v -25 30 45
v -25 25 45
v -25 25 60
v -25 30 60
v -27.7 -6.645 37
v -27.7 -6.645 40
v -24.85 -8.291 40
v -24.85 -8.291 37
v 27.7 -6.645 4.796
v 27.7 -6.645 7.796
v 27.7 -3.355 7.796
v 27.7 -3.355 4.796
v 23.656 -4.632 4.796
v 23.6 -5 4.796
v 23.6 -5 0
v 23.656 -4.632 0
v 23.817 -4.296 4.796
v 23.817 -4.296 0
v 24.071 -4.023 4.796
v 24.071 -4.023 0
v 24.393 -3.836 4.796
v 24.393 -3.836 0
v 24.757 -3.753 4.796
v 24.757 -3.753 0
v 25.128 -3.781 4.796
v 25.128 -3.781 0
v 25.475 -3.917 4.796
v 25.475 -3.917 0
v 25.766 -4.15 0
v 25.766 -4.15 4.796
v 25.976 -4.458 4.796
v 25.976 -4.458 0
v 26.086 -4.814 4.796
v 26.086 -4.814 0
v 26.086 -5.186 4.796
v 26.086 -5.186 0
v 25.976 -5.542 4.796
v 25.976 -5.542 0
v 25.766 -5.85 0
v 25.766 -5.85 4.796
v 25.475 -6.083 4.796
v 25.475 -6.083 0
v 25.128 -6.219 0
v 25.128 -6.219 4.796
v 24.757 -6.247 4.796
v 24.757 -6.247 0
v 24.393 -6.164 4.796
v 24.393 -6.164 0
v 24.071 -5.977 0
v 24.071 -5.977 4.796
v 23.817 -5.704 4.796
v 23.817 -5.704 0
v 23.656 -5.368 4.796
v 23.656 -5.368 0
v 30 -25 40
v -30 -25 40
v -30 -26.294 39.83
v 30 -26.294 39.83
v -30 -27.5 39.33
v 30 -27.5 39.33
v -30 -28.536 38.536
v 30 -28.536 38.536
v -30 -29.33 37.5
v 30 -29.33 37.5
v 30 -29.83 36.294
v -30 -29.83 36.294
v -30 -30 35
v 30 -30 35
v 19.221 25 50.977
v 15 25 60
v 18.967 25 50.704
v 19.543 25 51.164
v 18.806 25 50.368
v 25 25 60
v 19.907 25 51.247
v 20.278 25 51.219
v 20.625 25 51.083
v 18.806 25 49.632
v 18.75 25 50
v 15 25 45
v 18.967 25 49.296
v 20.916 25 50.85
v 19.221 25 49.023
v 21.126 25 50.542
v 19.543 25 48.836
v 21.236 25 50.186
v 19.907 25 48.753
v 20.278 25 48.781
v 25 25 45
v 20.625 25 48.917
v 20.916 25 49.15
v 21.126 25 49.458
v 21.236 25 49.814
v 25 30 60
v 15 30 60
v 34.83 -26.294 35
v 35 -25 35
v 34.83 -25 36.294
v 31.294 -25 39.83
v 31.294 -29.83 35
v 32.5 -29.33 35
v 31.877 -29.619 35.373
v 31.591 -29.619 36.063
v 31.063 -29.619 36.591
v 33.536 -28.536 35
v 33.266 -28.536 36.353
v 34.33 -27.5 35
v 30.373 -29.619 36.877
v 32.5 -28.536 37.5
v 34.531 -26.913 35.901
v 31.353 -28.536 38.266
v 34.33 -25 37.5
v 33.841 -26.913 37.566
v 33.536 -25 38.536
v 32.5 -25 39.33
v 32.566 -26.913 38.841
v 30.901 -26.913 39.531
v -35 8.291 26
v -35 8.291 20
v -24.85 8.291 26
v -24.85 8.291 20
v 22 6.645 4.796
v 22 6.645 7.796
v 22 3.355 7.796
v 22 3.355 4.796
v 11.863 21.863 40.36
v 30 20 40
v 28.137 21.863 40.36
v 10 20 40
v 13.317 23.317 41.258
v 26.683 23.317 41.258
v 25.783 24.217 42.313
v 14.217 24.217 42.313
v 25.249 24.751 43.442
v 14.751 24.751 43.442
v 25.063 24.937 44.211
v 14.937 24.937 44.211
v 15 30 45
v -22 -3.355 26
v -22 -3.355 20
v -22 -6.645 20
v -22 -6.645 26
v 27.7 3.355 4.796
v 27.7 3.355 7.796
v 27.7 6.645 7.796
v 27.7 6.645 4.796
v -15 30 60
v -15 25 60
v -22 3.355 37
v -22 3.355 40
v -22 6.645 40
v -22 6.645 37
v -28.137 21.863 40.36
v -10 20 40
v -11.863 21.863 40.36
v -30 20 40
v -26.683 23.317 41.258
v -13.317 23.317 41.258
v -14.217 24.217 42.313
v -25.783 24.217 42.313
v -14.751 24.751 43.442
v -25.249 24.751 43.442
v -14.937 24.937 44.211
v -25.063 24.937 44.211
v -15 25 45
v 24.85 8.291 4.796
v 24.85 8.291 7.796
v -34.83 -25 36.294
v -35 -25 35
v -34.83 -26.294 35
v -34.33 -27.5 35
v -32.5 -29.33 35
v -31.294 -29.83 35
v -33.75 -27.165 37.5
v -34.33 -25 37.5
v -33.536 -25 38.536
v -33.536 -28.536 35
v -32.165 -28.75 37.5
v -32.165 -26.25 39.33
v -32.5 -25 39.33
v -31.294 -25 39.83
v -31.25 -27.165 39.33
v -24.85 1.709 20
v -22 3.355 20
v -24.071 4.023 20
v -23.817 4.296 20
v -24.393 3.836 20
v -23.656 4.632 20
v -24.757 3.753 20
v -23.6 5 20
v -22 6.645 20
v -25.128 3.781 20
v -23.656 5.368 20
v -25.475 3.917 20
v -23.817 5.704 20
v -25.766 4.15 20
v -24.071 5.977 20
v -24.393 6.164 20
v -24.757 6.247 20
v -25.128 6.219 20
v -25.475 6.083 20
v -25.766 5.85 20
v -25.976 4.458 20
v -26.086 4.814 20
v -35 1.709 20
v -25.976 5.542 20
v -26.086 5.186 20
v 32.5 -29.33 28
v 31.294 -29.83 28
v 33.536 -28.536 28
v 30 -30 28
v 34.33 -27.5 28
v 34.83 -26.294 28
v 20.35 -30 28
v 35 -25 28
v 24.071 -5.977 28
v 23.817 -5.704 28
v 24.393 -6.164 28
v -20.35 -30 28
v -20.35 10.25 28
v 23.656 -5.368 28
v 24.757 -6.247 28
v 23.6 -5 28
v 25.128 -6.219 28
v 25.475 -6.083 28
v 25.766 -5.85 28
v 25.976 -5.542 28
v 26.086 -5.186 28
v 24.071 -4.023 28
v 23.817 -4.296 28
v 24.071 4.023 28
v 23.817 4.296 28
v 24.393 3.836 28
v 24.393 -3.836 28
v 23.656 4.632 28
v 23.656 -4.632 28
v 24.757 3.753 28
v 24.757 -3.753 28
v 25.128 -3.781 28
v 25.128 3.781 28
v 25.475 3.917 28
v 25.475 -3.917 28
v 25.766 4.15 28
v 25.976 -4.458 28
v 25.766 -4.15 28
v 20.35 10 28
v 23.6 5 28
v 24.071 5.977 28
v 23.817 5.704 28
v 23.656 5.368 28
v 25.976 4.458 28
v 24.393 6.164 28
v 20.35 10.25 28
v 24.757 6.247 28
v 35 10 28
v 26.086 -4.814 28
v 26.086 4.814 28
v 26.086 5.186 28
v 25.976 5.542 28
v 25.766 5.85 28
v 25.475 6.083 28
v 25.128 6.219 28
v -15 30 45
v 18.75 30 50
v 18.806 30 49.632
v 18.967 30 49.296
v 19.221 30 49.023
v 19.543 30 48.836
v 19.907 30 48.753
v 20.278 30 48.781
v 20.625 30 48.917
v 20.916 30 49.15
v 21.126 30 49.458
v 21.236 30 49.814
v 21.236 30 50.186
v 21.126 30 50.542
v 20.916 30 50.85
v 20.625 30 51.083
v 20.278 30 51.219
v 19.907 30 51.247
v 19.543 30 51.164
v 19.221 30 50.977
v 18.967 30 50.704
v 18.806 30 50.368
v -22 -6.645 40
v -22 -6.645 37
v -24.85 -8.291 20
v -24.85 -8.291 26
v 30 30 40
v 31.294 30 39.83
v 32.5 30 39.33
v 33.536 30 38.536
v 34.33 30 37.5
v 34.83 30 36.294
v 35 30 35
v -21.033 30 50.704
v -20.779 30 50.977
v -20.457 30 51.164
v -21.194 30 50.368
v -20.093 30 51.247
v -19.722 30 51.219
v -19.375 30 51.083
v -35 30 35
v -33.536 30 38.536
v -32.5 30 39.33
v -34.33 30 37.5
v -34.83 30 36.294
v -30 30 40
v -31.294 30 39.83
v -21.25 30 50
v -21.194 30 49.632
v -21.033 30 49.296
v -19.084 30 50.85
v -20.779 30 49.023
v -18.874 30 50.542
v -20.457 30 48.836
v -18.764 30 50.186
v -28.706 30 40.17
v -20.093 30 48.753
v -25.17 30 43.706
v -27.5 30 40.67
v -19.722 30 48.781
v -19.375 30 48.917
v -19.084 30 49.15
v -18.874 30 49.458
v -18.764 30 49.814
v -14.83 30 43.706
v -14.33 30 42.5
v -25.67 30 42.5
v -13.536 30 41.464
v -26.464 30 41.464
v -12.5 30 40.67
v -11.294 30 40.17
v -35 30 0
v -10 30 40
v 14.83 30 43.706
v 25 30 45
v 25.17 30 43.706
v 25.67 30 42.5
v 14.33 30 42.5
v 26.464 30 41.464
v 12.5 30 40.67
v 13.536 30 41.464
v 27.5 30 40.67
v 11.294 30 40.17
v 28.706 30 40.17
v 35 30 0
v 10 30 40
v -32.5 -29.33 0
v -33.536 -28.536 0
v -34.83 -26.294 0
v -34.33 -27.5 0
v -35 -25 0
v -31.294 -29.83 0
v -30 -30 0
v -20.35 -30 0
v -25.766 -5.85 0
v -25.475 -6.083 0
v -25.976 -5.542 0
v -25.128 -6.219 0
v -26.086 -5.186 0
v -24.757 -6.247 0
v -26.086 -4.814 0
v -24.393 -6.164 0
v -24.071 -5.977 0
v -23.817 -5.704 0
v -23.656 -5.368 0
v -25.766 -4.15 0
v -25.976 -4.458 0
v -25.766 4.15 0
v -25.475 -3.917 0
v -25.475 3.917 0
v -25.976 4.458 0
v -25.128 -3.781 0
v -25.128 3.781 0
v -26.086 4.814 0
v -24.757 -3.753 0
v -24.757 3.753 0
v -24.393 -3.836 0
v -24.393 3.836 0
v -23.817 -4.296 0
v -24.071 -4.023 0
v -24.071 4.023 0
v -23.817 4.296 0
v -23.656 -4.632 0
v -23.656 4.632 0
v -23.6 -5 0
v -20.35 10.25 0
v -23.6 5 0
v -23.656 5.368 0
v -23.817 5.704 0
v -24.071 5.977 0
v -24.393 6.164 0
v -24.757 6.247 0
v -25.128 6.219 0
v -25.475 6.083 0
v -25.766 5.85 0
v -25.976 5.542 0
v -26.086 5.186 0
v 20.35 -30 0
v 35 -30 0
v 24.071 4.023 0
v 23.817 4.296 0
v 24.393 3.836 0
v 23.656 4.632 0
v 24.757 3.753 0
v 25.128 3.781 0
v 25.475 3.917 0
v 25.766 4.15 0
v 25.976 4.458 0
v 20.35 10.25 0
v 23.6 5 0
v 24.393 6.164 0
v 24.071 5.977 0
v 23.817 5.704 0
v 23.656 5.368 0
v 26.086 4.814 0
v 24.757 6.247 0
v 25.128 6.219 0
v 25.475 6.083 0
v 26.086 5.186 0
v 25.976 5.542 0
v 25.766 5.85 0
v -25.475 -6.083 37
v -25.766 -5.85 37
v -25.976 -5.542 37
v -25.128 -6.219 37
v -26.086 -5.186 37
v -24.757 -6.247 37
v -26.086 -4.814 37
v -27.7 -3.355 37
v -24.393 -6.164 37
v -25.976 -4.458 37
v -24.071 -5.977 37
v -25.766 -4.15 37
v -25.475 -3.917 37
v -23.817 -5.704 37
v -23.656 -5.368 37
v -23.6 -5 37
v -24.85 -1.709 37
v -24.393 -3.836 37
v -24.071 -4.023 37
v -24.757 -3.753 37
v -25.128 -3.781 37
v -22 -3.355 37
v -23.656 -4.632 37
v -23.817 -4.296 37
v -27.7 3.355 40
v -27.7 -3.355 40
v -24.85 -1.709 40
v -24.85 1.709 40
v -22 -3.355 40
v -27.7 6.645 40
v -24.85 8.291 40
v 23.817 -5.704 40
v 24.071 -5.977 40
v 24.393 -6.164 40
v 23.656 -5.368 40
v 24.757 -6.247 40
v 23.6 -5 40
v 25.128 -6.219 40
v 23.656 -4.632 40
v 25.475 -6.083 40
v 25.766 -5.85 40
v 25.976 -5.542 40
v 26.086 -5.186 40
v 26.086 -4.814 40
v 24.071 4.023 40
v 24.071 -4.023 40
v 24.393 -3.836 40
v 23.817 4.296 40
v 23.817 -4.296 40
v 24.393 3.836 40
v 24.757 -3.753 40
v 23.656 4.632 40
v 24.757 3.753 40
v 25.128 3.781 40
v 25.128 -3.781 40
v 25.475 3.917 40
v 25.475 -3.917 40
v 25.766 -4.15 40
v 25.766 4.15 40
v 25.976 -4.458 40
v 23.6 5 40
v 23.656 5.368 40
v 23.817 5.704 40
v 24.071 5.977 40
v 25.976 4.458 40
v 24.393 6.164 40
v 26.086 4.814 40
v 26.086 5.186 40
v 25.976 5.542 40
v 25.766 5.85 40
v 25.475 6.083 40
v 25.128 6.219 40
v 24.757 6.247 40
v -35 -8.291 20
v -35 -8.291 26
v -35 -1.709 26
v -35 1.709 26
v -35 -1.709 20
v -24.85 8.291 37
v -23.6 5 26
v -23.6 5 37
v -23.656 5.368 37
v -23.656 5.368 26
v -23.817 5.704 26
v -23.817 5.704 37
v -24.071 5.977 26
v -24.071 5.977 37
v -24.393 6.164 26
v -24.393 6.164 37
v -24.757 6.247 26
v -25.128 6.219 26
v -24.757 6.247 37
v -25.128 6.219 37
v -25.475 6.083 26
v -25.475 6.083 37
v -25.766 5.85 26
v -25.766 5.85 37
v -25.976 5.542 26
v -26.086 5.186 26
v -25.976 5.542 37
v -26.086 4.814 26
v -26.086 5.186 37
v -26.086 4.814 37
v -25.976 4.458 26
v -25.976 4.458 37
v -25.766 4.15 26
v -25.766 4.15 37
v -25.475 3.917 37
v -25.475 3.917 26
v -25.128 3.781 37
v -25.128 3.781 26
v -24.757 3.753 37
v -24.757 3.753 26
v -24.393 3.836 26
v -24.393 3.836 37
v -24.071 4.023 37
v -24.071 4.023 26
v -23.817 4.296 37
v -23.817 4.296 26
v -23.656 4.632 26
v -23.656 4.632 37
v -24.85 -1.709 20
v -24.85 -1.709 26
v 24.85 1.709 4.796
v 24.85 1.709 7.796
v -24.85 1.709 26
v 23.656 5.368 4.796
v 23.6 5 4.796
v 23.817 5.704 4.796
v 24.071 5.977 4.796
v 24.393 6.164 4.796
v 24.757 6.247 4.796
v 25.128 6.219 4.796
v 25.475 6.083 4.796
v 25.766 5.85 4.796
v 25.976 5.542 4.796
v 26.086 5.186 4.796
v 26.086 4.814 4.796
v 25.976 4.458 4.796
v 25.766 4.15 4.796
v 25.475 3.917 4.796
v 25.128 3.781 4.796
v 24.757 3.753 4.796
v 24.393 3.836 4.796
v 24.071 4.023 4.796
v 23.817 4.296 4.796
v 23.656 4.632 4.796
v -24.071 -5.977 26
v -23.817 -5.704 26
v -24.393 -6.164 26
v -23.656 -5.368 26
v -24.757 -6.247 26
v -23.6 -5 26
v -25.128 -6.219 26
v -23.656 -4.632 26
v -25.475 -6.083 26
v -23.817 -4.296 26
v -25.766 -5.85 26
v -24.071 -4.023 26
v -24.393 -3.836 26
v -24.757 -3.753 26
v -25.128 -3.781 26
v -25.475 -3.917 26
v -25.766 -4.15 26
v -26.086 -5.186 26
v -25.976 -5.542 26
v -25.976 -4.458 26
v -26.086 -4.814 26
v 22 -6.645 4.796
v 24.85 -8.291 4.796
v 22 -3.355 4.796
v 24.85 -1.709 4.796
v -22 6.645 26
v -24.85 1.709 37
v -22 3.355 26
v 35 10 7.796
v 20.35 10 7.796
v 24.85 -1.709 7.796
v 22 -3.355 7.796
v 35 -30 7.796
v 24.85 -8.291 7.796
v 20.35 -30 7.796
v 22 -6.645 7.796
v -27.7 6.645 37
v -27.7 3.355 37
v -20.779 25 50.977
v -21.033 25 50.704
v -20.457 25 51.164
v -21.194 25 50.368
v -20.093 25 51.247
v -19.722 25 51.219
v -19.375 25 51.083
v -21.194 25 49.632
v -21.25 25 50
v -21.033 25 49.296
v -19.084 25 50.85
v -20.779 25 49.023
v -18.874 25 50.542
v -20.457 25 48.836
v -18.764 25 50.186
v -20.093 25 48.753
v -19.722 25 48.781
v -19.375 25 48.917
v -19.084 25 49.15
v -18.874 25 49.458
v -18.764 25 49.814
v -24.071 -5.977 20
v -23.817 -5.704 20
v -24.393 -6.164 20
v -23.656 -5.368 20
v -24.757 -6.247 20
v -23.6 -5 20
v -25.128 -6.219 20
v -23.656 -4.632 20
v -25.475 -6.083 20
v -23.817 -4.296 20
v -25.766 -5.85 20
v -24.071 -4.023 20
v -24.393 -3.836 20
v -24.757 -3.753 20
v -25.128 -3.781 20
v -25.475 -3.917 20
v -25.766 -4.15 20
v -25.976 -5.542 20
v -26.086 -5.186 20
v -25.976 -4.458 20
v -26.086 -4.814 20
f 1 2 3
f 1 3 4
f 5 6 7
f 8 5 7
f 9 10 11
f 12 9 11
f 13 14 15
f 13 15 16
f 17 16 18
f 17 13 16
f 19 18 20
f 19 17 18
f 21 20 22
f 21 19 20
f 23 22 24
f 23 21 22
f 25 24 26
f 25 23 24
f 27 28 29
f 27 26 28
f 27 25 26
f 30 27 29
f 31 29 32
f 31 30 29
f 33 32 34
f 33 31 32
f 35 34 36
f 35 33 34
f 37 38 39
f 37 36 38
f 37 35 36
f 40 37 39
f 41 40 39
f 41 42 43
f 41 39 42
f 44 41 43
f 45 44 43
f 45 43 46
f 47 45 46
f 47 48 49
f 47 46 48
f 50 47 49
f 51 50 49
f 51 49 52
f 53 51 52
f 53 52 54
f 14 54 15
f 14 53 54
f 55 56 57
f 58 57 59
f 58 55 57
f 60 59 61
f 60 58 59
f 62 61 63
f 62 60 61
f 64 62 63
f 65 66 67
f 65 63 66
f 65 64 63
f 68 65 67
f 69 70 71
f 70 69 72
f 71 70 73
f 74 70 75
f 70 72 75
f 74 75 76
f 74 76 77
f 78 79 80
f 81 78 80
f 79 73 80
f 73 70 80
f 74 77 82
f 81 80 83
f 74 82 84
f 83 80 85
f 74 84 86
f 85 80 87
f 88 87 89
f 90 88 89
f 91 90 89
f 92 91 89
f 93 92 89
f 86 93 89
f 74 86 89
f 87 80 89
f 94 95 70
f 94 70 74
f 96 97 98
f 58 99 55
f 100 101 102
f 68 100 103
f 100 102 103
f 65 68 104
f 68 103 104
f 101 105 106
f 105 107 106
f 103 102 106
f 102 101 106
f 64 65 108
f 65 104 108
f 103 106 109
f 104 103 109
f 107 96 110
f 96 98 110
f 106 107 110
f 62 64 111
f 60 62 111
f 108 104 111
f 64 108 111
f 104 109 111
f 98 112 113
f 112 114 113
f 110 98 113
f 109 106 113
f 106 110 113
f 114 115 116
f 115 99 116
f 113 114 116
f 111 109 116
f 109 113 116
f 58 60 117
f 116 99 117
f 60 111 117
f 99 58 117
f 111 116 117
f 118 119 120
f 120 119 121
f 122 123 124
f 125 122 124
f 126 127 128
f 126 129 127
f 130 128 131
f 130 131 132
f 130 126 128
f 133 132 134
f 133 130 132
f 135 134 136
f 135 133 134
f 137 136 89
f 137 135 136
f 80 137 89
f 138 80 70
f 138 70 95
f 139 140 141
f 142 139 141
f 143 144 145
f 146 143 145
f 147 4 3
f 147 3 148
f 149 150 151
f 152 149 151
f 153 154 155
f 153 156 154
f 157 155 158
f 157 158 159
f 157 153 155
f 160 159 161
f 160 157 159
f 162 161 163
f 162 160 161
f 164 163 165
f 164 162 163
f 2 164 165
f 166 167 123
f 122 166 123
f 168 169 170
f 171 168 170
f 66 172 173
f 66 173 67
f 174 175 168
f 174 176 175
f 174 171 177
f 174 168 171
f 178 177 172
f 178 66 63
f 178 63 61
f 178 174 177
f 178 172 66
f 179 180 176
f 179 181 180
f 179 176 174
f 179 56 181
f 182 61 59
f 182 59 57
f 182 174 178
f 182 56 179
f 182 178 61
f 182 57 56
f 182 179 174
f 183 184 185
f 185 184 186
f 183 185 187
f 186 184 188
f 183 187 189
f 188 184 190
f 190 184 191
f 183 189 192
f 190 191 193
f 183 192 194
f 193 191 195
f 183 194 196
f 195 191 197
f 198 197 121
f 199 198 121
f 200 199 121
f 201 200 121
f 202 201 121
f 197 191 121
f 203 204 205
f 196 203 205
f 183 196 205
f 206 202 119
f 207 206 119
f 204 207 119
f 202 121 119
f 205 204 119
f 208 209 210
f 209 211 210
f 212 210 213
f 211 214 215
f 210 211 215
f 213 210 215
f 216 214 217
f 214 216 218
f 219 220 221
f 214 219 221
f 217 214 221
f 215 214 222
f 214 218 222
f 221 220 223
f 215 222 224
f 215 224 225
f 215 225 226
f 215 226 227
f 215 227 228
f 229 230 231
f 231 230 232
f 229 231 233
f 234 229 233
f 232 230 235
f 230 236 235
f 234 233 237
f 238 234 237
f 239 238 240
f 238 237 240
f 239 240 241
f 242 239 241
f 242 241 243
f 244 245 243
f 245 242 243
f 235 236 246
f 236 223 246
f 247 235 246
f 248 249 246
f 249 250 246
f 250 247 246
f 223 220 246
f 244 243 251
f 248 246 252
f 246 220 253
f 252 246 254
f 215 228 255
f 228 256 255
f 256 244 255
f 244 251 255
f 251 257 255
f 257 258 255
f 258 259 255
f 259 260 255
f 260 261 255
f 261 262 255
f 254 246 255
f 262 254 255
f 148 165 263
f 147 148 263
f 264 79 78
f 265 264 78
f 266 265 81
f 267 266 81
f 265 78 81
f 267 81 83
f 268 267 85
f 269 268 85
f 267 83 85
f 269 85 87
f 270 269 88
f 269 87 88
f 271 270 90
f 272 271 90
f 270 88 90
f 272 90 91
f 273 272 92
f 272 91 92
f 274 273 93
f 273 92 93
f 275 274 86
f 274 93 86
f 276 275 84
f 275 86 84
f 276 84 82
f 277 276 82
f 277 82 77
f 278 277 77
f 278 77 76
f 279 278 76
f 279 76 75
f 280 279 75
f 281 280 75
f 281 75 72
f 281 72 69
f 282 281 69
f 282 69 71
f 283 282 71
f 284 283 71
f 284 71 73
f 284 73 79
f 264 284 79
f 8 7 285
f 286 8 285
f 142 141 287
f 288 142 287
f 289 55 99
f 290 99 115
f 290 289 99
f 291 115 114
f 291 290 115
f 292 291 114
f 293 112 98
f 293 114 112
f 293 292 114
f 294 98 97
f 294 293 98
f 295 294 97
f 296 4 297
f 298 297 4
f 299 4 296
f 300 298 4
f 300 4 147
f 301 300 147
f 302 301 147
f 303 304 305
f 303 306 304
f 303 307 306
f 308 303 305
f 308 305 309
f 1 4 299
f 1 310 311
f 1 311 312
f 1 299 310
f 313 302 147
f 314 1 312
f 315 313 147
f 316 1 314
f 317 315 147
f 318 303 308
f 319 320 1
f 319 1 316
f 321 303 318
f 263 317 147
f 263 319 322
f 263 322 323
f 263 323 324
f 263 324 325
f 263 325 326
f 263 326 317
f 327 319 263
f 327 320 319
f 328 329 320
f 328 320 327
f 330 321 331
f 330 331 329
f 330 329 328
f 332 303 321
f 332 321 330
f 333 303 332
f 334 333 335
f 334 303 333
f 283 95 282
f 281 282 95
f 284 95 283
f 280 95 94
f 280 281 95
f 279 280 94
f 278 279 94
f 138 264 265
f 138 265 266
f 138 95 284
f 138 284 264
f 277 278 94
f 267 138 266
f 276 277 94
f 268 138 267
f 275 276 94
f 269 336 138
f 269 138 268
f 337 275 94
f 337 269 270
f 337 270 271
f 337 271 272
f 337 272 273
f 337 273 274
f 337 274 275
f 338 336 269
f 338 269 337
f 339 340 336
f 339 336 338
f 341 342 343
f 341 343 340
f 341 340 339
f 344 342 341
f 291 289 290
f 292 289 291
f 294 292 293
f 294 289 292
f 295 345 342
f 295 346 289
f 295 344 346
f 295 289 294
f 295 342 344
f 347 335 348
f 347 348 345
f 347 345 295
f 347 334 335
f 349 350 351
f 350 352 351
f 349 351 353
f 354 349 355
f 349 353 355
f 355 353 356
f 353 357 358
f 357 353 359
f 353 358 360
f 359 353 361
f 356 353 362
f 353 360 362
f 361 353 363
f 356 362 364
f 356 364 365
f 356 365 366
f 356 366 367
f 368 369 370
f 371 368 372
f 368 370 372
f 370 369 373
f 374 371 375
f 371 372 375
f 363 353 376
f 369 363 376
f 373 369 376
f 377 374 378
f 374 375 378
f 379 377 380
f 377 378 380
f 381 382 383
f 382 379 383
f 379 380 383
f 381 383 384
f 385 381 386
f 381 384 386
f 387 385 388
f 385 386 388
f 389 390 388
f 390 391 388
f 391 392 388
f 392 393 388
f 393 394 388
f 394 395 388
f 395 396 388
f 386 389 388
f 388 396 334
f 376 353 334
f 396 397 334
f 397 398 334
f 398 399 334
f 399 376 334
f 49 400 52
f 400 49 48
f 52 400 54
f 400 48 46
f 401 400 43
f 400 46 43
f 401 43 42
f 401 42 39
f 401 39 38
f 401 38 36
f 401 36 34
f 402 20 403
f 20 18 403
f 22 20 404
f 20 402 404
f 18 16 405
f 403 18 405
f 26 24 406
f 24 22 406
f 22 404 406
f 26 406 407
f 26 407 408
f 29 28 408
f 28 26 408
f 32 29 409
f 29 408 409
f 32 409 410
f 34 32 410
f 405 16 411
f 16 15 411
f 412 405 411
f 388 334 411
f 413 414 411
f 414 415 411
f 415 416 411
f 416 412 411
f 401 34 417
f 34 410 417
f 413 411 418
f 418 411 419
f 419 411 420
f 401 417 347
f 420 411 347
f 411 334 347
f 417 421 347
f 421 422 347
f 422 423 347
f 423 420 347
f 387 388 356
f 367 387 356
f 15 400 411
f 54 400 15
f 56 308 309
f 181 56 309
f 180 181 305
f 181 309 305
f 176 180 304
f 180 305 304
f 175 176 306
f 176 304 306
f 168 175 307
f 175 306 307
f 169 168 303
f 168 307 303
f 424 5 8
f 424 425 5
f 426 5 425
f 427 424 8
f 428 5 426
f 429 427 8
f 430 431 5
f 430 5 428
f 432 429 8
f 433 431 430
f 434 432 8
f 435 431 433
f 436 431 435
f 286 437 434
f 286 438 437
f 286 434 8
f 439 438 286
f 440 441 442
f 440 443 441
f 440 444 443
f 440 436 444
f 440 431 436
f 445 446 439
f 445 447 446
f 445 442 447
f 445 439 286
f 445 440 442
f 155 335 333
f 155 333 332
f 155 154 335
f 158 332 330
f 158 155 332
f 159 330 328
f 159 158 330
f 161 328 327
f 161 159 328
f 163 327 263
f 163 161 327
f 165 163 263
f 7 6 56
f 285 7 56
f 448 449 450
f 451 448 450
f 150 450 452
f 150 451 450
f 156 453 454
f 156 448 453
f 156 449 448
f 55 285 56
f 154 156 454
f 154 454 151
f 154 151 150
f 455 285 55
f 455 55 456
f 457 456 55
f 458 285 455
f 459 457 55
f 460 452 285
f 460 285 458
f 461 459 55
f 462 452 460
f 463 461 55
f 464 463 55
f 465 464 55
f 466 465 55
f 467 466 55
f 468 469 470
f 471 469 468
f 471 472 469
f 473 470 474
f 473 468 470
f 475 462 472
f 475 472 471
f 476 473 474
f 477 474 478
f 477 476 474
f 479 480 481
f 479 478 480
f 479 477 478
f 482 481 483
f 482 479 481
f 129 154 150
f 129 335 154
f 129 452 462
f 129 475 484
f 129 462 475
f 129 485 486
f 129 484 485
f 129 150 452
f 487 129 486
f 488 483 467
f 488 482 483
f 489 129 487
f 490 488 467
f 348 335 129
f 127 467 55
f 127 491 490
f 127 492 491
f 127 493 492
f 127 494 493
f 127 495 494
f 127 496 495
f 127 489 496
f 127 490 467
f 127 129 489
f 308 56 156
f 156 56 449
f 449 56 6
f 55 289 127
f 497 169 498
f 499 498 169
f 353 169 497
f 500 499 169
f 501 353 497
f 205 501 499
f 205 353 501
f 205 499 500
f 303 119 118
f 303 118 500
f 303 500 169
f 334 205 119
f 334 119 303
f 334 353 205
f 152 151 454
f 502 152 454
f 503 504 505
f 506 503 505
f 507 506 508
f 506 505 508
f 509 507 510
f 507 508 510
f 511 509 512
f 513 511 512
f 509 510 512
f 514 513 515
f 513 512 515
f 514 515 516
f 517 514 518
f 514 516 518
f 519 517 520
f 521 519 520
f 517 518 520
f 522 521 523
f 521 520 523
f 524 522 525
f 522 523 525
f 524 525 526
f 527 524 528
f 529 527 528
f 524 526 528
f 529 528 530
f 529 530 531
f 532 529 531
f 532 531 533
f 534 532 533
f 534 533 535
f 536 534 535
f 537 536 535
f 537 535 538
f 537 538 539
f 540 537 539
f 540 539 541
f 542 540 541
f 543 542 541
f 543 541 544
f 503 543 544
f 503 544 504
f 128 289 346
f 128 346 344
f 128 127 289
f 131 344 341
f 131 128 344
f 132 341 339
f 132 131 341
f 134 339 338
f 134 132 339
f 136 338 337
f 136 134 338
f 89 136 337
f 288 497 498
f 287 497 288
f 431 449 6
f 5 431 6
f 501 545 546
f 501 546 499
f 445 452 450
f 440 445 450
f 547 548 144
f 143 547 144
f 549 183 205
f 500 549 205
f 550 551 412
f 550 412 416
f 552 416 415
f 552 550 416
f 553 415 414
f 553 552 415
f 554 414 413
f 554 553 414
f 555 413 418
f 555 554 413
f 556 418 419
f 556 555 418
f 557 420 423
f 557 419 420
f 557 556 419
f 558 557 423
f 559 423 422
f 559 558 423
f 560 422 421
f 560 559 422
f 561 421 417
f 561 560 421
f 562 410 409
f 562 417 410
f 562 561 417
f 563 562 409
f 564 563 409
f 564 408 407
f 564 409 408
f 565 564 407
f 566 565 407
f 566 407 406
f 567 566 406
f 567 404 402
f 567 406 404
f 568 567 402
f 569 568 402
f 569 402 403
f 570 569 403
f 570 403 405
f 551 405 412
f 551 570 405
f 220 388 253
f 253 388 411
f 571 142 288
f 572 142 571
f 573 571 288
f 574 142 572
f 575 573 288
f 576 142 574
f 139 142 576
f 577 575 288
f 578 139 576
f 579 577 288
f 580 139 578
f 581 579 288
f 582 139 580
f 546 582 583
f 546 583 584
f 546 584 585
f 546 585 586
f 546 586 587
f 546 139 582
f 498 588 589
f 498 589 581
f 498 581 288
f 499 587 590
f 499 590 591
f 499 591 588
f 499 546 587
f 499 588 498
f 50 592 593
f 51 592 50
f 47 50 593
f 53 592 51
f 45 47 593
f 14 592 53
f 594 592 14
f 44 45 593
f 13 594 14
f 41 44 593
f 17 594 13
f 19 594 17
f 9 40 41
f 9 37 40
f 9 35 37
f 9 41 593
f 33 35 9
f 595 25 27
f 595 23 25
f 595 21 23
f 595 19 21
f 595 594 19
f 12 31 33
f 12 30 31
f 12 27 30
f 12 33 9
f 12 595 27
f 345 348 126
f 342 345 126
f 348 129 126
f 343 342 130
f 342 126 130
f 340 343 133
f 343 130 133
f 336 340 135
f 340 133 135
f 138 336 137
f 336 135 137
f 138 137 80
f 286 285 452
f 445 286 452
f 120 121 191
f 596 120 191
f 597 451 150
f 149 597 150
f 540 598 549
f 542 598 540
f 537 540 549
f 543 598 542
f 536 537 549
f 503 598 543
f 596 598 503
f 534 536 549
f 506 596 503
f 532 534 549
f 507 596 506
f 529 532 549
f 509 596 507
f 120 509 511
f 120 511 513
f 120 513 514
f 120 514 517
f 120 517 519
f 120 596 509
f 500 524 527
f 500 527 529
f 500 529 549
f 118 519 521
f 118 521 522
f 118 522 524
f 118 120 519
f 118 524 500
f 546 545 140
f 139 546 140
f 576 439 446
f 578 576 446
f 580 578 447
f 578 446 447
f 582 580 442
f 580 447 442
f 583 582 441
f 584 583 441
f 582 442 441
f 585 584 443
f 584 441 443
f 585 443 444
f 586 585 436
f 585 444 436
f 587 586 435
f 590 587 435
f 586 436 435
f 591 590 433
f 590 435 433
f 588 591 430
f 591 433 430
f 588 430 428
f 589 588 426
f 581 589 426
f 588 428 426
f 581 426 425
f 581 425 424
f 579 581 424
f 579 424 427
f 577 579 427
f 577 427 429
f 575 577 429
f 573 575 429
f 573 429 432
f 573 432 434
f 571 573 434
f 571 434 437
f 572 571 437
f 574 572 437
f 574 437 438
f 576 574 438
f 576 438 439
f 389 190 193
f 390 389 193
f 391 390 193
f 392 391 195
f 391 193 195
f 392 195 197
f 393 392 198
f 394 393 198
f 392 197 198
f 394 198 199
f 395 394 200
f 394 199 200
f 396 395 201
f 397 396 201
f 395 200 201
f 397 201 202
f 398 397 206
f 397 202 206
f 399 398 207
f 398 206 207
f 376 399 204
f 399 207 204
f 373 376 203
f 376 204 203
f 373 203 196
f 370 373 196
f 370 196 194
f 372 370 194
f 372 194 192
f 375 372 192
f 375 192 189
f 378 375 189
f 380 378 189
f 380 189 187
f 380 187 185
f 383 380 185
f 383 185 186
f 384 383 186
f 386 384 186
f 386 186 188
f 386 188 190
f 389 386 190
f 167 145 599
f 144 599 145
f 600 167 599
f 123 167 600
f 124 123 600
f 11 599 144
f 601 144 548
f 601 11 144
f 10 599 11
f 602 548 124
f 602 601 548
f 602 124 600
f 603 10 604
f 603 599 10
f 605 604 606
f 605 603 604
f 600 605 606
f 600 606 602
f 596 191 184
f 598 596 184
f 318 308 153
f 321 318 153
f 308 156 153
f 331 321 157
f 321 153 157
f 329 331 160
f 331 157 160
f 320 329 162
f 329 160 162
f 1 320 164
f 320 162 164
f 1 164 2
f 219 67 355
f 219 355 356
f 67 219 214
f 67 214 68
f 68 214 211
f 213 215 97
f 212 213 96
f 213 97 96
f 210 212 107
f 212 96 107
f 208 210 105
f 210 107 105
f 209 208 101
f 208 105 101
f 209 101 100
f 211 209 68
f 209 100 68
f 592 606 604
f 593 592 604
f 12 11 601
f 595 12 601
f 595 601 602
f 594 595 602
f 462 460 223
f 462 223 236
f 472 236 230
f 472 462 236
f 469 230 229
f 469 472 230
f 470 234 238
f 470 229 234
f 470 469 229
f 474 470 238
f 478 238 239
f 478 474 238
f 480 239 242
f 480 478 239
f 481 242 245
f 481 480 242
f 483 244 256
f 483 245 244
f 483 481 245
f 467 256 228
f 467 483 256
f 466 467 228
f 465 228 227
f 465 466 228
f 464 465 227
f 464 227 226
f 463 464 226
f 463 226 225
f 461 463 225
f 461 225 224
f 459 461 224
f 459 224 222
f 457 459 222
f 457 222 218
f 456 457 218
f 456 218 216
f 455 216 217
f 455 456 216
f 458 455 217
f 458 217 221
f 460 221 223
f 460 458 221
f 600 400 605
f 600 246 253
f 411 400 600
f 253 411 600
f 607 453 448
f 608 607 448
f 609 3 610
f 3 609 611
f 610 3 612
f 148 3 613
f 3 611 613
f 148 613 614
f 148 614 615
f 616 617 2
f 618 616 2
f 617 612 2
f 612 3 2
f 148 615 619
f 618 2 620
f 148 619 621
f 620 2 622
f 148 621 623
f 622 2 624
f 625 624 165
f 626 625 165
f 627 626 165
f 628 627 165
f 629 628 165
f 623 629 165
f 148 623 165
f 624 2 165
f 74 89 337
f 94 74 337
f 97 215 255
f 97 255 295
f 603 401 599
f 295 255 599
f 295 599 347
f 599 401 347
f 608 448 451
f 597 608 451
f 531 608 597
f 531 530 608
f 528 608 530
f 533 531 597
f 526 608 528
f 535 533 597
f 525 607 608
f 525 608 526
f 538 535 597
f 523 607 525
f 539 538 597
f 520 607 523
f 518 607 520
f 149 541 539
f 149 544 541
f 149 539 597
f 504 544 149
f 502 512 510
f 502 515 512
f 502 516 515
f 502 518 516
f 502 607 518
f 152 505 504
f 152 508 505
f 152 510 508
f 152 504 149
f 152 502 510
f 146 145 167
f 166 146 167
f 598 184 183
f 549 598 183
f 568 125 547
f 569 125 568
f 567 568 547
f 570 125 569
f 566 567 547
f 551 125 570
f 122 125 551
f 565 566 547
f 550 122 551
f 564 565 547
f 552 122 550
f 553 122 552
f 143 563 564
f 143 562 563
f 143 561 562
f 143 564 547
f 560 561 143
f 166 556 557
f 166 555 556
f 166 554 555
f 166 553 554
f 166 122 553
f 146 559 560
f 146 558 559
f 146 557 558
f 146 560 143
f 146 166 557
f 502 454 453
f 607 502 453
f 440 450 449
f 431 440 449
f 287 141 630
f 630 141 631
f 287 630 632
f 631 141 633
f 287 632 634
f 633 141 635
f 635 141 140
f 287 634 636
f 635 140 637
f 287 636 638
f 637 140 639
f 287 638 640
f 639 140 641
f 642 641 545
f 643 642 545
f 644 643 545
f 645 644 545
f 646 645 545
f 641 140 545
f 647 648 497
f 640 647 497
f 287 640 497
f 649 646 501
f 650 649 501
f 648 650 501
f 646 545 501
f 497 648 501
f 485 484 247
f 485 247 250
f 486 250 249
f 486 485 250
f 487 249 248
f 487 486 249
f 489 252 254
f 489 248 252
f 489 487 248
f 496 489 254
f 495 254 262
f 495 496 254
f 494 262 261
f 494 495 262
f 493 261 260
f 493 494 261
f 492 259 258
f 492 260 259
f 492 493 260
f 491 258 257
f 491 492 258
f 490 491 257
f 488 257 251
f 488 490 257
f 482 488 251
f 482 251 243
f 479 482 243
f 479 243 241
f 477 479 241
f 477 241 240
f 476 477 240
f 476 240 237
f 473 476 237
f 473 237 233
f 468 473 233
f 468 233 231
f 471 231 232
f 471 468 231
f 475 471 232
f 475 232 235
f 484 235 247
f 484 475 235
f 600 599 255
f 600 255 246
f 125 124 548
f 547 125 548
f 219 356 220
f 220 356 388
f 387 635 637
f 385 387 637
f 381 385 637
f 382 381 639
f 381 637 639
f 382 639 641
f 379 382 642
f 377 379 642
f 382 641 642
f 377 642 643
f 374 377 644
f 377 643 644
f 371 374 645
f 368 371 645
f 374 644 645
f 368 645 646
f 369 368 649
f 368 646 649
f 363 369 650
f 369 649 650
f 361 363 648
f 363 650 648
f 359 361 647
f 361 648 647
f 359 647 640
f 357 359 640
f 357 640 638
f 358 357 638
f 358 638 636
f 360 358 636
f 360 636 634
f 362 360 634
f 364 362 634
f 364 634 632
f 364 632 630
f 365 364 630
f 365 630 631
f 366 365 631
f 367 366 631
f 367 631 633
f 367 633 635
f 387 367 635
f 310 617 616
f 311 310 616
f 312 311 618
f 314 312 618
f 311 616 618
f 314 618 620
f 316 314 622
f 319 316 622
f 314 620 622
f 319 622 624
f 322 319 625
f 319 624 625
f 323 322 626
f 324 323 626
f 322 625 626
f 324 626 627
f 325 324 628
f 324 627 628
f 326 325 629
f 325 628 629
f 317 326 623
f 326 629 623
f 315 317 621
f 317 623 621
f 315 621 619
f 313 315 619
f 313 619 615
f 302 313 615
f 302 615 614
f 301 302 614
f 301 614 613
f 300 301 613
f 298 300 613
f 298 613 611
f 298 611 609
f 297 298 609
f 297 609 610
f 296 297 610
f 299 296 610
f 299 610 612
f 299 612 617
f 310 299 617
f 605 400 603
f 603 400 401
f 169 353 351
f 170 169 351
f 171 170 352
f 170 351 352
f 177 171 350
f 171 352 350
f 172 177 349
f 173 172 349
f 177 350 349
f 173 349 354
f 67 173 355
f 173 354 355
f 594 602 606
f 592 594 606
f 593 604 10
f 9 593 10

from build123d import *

# Parameters (mm, degrees)
SKETCH_2_W           = 70
SKETCH_2_H           = 60
EXTRUDE_2_DEPTH      = 40
SKETCH_3_W           = 40.7
SKETCH_3_H           = 20.5
CUT_EXTRUDE_1_DEPTH  = 28
SKETCH_4_W           = 14.65
SKETCH_4_H           = 20.5
EXTRUDE_3_DEPTH      = 28
SKETCH_8_W           = 10
SKETCH_8_H           = 5
EXTRUDE_5_DEPTH      = 60
SKETCH_15_W          = 40.7
SKETCH_15_H          = 40.25
CUT_EXTRUDE_6_DEPTH  = 28
SKETCH_16_W          = 14.65
SKETCH_16_H          = 20.204149113
CUT_EXTRUDE_7_DEPTH  = 40
M3X0_5_1_D           = 2.5
FILLET_1_R           = 5
FILLET_2_R           = 5
FILLET_3_R           = 5
M3X0_5_2_D           = 2.5
CUT_EXTRUDE_8_DEPTH  = 3
CUT_EXTRUDE_9_DEPTH  = 3
CUT_EXTRUDE_10_DEPTH = 6


# Some blends are built 0.0001 mm under size
with BuildPart() as part:
    # ｽｹｯﾁ2 → ﾎﾞｽ - 押し出し2 (new body)
    with BuildSketch(Plane.XY):
        Rectangle(SKETCH_2_W, SKETCH_2_H)
    extrude(amount=EXTRUDE_2_DEPTH)

    # ｽｹｯﾁ3 → ｶｯﾄ - 押し出し1 (cut)
    with BuildSketch(Plane.XY):
        Rectangle(SKETCH_3_W, SKETCH_3_H)
    extrude(amount=CUT_EXTRUDE_1_DEPTH, mode=Mode.SUBTRACT)

    # ｽｹｯﾁ4 → ﾎﾞｽ - 押し出し3 (add)
    with BuildSketch(Plane.XY):
        with Locations((27.675, 0)):
            Rectangle(SKETCH_4_W, SKETCH_4_H)
    extrude(amount=EXTRUDE_3_DEPTH)

    # ｽｹｯﾁ8 → ﾎﾞｽ - 押し出し5 (add)
    with BuildSketch(Plane.XY):
        with Locations((-20, 27.5)):
            Rectangle(SKETCH_8_W, SKETCH_8_H)
        with Locations((20, 27.5)):
            Rectangle(SKETCH_8_W, SKETCH_8_H)
    extrude(amount=EXTRUDE_5_DEPTH)

    # ｽｹｯﾁ15 → ｶｯﾄ - 押し出し6 (cut)
    with BuildSketch(Plane.XY):
        with Locations((0, -9.875)):
            Rectangle(SKETCH_15_W, SKETCH_15_H)
    extrude(amount=CUT_EXTRUDE_6_DEPTH, mode=Mode.SUBTRACT)

    # ｽｹｯﾁ16 → ｶｯﾄ - 押し出し7 (cut)
    with BuildSketch(Plane(origin=(0, -30, 0), x_dir=(-1, 0, 0), z_dir=(0, -1, 0))):
        with Locations((-27.675, -17.897925444)):
            Rectangle(SKETCH_16_W, SKETCH_16_H)
    extrude(amount=-CUT_EXTRUDE_7_DEPTH, mode=Mode.SUBTRACT)

    # M3x0.5 ねじ穴1 (through all)
    with Locations(Plane(origin=(0, 30, 0), x_dir=(1, 0, 0), z_dir=(0, 1, 0))):
        with Locations((-20, -50), (20, -50)):
            Hole(M3X0_5_1_D / 2)

    # ﾌｨﾚｯﾄ1
    fillet_1_edges = [part.edges().sort_by_distance(p)[0] for p in [
        (-15, 27.5, 40),
        (-20, 25, 40),
        (-25, 27.5, 40),
        (20, 25, 40),
        (15, 27.5, 40),
        (25, 27.5, 40),
    ]]
    fillet(fillet_1_edges, radius=FILLET_1_R)

    # ﾌｨﾚｯﾄ2
    fillet_2_edges = [part.edges().sort_by_distance(p)[0] for p in [
        (35, 0, 40),
        (35, -30, 34),
        (0, -30, 40),
        (-35, 0, 40),
    ]]
    fillet(fillet_2_edges, radius=FILLET_2_R - 0.0001)  # a hair under: the kernel refuses the full size

    # ﾌｨﾚｯﾄ3
    # the kernel refuses this fillet: 5 mm, written as the material it takes off along each edge
    with BuildSketch(Plane(origin=(-30, -25, 40), x_dir=(-1, 0, 0), z_dir=(0, 1, 0))) as fillet_3_piece_1:
        with BuildLine():
            CenterArc((0.0001, -4.9999), 4.9999, 0, 90)
            Line((5, -4.9999), (5, 0))
            Line((5, 0), (0.0001, 0))
        make_face()
    revolve(axis=Axis((-30, -25, 40), (0, 0, 1)), revolution_arc=90, mode=Mode.SUBTRACT)
    with BuildSketch(Plane(origin=(-35, -30, -12.5), x_dir=(0, 1, 0), z_dir=(0, 0, 1))) as fillet_3_piece_2:
        with BuildLine():
            CenterArc((FILLET_3_R, -FILLET_3_R), FILLET_3_R, 90, 90)
            Line((0, -FILLET_3_R), (0, 0))
            Line((0, 0), (FILLET_3_R, 0))
        make_face()
    extrude(amount=52.5, mode=Mode.SUBTRACT)

    # M3x0.5 ねじ穴2 (through all)
    with Locations(Plane(origin=(0, 0, 0), x_dir=(-1, 0, 0), z_dir=(0, 0, -1))):
        with Locations((24.85, 5), (24.85, -5)):
            m3x0_5_2 = Hole(M3X0_5_2_D / 2)

    # ﾐﾗｰ1: M3x0.5 ねじ穴2 across plane
    add(m3x0_5_2.mirror(Plane(origin=(0, 0, 0), x_dir=(0, 0, 1), z_dir=(1, 0, 0))), mode=Mode.SUBTRACT)

    # ｽｹｯﾁ17 → ｶｯﾄ - 押し出し8 (cut)
    with BuildSketch(Plane.XY.offset(40)):
        Polygon((-24.85, 8.290896534), (-27.7, 6.645448267), (-27.7, 3.354551733), (-24.85, 1.709103466), (-22, 3.354551733), (-22, 6.645448267), align=None)
        Polygon((-22, -6.645448267), (-22, -3.354551733), (-24.85, -1.709103466), (-27.7, -3.354551733), (-27.7, -6.645448267), (-24.85, -8.290896534), align=None)
    extrude(amount=-CUT_EXTRUDE_8_DEPTH, mode=Mode.SUBTRACT)

    # ｽｹｯﾁ18 → ｶｯﾄ - 押し出し9 (cut)
    with BuildSketch(Plane.XY.offset(7.795850887)):
        Polygon((27.7, 3.354551733), (27.7, 6.645448267), (24.85, 8.290896534), (22, 6.645448267), (22, 3.354551733), (24.85, 1.709103466), align=None)
        Polygon((27.7, -6.645448267), (27.7, -3.354551733), (24.85, -1.709103466), (22, -3.354551733), (22, -6.645448267), (24.85, -8.290896534), align=None)
    extrude(amount=-CUT_EXTRUDE_9_DEPTH, mode=Mode.SUBTRACT)

    # ｽｹｯﾁ19 → ｶｯﾄ - 押し出し10 (cut)
    with BuildSketch(Plane(origin=(0, 0, 20), x_dir=(-1, 0, 0), z_dir=(0, 0, -1))):
        Polygon((35, 1.709103466), (35, 8.290896534), (24.85, 8.290896534), (27.7, 6.645448267), (27.7, 3.354551733), (24.85, 1.709103466), align=None)
        Polygon((22, 6.645448267), (22, 3.354551733), (24.85, 1.709103466), (27.7, 3.354551733), (27.7, 6.645448267), (24.85, 8.290896534), align=None)
        Polygon((22, -6.645448267), (24.85, -8.290896534), (27.7, -6.645448267), (27.7, -3.354551733), (24.85, -1.709103466), (22, -3.354551733), align=None)
        Polygon((35, -8.290896534), (24.85, -8.290896534), (27.7, -6.645448267), (27.7, -3.354551733), (24.85, -1.709103466), (35, -1.709103466), align=None)
    extrude(amount=-CUT_EXTRUDE_10_DEPTH, mode=Mode.SUBTRACT)


solid = part.part
